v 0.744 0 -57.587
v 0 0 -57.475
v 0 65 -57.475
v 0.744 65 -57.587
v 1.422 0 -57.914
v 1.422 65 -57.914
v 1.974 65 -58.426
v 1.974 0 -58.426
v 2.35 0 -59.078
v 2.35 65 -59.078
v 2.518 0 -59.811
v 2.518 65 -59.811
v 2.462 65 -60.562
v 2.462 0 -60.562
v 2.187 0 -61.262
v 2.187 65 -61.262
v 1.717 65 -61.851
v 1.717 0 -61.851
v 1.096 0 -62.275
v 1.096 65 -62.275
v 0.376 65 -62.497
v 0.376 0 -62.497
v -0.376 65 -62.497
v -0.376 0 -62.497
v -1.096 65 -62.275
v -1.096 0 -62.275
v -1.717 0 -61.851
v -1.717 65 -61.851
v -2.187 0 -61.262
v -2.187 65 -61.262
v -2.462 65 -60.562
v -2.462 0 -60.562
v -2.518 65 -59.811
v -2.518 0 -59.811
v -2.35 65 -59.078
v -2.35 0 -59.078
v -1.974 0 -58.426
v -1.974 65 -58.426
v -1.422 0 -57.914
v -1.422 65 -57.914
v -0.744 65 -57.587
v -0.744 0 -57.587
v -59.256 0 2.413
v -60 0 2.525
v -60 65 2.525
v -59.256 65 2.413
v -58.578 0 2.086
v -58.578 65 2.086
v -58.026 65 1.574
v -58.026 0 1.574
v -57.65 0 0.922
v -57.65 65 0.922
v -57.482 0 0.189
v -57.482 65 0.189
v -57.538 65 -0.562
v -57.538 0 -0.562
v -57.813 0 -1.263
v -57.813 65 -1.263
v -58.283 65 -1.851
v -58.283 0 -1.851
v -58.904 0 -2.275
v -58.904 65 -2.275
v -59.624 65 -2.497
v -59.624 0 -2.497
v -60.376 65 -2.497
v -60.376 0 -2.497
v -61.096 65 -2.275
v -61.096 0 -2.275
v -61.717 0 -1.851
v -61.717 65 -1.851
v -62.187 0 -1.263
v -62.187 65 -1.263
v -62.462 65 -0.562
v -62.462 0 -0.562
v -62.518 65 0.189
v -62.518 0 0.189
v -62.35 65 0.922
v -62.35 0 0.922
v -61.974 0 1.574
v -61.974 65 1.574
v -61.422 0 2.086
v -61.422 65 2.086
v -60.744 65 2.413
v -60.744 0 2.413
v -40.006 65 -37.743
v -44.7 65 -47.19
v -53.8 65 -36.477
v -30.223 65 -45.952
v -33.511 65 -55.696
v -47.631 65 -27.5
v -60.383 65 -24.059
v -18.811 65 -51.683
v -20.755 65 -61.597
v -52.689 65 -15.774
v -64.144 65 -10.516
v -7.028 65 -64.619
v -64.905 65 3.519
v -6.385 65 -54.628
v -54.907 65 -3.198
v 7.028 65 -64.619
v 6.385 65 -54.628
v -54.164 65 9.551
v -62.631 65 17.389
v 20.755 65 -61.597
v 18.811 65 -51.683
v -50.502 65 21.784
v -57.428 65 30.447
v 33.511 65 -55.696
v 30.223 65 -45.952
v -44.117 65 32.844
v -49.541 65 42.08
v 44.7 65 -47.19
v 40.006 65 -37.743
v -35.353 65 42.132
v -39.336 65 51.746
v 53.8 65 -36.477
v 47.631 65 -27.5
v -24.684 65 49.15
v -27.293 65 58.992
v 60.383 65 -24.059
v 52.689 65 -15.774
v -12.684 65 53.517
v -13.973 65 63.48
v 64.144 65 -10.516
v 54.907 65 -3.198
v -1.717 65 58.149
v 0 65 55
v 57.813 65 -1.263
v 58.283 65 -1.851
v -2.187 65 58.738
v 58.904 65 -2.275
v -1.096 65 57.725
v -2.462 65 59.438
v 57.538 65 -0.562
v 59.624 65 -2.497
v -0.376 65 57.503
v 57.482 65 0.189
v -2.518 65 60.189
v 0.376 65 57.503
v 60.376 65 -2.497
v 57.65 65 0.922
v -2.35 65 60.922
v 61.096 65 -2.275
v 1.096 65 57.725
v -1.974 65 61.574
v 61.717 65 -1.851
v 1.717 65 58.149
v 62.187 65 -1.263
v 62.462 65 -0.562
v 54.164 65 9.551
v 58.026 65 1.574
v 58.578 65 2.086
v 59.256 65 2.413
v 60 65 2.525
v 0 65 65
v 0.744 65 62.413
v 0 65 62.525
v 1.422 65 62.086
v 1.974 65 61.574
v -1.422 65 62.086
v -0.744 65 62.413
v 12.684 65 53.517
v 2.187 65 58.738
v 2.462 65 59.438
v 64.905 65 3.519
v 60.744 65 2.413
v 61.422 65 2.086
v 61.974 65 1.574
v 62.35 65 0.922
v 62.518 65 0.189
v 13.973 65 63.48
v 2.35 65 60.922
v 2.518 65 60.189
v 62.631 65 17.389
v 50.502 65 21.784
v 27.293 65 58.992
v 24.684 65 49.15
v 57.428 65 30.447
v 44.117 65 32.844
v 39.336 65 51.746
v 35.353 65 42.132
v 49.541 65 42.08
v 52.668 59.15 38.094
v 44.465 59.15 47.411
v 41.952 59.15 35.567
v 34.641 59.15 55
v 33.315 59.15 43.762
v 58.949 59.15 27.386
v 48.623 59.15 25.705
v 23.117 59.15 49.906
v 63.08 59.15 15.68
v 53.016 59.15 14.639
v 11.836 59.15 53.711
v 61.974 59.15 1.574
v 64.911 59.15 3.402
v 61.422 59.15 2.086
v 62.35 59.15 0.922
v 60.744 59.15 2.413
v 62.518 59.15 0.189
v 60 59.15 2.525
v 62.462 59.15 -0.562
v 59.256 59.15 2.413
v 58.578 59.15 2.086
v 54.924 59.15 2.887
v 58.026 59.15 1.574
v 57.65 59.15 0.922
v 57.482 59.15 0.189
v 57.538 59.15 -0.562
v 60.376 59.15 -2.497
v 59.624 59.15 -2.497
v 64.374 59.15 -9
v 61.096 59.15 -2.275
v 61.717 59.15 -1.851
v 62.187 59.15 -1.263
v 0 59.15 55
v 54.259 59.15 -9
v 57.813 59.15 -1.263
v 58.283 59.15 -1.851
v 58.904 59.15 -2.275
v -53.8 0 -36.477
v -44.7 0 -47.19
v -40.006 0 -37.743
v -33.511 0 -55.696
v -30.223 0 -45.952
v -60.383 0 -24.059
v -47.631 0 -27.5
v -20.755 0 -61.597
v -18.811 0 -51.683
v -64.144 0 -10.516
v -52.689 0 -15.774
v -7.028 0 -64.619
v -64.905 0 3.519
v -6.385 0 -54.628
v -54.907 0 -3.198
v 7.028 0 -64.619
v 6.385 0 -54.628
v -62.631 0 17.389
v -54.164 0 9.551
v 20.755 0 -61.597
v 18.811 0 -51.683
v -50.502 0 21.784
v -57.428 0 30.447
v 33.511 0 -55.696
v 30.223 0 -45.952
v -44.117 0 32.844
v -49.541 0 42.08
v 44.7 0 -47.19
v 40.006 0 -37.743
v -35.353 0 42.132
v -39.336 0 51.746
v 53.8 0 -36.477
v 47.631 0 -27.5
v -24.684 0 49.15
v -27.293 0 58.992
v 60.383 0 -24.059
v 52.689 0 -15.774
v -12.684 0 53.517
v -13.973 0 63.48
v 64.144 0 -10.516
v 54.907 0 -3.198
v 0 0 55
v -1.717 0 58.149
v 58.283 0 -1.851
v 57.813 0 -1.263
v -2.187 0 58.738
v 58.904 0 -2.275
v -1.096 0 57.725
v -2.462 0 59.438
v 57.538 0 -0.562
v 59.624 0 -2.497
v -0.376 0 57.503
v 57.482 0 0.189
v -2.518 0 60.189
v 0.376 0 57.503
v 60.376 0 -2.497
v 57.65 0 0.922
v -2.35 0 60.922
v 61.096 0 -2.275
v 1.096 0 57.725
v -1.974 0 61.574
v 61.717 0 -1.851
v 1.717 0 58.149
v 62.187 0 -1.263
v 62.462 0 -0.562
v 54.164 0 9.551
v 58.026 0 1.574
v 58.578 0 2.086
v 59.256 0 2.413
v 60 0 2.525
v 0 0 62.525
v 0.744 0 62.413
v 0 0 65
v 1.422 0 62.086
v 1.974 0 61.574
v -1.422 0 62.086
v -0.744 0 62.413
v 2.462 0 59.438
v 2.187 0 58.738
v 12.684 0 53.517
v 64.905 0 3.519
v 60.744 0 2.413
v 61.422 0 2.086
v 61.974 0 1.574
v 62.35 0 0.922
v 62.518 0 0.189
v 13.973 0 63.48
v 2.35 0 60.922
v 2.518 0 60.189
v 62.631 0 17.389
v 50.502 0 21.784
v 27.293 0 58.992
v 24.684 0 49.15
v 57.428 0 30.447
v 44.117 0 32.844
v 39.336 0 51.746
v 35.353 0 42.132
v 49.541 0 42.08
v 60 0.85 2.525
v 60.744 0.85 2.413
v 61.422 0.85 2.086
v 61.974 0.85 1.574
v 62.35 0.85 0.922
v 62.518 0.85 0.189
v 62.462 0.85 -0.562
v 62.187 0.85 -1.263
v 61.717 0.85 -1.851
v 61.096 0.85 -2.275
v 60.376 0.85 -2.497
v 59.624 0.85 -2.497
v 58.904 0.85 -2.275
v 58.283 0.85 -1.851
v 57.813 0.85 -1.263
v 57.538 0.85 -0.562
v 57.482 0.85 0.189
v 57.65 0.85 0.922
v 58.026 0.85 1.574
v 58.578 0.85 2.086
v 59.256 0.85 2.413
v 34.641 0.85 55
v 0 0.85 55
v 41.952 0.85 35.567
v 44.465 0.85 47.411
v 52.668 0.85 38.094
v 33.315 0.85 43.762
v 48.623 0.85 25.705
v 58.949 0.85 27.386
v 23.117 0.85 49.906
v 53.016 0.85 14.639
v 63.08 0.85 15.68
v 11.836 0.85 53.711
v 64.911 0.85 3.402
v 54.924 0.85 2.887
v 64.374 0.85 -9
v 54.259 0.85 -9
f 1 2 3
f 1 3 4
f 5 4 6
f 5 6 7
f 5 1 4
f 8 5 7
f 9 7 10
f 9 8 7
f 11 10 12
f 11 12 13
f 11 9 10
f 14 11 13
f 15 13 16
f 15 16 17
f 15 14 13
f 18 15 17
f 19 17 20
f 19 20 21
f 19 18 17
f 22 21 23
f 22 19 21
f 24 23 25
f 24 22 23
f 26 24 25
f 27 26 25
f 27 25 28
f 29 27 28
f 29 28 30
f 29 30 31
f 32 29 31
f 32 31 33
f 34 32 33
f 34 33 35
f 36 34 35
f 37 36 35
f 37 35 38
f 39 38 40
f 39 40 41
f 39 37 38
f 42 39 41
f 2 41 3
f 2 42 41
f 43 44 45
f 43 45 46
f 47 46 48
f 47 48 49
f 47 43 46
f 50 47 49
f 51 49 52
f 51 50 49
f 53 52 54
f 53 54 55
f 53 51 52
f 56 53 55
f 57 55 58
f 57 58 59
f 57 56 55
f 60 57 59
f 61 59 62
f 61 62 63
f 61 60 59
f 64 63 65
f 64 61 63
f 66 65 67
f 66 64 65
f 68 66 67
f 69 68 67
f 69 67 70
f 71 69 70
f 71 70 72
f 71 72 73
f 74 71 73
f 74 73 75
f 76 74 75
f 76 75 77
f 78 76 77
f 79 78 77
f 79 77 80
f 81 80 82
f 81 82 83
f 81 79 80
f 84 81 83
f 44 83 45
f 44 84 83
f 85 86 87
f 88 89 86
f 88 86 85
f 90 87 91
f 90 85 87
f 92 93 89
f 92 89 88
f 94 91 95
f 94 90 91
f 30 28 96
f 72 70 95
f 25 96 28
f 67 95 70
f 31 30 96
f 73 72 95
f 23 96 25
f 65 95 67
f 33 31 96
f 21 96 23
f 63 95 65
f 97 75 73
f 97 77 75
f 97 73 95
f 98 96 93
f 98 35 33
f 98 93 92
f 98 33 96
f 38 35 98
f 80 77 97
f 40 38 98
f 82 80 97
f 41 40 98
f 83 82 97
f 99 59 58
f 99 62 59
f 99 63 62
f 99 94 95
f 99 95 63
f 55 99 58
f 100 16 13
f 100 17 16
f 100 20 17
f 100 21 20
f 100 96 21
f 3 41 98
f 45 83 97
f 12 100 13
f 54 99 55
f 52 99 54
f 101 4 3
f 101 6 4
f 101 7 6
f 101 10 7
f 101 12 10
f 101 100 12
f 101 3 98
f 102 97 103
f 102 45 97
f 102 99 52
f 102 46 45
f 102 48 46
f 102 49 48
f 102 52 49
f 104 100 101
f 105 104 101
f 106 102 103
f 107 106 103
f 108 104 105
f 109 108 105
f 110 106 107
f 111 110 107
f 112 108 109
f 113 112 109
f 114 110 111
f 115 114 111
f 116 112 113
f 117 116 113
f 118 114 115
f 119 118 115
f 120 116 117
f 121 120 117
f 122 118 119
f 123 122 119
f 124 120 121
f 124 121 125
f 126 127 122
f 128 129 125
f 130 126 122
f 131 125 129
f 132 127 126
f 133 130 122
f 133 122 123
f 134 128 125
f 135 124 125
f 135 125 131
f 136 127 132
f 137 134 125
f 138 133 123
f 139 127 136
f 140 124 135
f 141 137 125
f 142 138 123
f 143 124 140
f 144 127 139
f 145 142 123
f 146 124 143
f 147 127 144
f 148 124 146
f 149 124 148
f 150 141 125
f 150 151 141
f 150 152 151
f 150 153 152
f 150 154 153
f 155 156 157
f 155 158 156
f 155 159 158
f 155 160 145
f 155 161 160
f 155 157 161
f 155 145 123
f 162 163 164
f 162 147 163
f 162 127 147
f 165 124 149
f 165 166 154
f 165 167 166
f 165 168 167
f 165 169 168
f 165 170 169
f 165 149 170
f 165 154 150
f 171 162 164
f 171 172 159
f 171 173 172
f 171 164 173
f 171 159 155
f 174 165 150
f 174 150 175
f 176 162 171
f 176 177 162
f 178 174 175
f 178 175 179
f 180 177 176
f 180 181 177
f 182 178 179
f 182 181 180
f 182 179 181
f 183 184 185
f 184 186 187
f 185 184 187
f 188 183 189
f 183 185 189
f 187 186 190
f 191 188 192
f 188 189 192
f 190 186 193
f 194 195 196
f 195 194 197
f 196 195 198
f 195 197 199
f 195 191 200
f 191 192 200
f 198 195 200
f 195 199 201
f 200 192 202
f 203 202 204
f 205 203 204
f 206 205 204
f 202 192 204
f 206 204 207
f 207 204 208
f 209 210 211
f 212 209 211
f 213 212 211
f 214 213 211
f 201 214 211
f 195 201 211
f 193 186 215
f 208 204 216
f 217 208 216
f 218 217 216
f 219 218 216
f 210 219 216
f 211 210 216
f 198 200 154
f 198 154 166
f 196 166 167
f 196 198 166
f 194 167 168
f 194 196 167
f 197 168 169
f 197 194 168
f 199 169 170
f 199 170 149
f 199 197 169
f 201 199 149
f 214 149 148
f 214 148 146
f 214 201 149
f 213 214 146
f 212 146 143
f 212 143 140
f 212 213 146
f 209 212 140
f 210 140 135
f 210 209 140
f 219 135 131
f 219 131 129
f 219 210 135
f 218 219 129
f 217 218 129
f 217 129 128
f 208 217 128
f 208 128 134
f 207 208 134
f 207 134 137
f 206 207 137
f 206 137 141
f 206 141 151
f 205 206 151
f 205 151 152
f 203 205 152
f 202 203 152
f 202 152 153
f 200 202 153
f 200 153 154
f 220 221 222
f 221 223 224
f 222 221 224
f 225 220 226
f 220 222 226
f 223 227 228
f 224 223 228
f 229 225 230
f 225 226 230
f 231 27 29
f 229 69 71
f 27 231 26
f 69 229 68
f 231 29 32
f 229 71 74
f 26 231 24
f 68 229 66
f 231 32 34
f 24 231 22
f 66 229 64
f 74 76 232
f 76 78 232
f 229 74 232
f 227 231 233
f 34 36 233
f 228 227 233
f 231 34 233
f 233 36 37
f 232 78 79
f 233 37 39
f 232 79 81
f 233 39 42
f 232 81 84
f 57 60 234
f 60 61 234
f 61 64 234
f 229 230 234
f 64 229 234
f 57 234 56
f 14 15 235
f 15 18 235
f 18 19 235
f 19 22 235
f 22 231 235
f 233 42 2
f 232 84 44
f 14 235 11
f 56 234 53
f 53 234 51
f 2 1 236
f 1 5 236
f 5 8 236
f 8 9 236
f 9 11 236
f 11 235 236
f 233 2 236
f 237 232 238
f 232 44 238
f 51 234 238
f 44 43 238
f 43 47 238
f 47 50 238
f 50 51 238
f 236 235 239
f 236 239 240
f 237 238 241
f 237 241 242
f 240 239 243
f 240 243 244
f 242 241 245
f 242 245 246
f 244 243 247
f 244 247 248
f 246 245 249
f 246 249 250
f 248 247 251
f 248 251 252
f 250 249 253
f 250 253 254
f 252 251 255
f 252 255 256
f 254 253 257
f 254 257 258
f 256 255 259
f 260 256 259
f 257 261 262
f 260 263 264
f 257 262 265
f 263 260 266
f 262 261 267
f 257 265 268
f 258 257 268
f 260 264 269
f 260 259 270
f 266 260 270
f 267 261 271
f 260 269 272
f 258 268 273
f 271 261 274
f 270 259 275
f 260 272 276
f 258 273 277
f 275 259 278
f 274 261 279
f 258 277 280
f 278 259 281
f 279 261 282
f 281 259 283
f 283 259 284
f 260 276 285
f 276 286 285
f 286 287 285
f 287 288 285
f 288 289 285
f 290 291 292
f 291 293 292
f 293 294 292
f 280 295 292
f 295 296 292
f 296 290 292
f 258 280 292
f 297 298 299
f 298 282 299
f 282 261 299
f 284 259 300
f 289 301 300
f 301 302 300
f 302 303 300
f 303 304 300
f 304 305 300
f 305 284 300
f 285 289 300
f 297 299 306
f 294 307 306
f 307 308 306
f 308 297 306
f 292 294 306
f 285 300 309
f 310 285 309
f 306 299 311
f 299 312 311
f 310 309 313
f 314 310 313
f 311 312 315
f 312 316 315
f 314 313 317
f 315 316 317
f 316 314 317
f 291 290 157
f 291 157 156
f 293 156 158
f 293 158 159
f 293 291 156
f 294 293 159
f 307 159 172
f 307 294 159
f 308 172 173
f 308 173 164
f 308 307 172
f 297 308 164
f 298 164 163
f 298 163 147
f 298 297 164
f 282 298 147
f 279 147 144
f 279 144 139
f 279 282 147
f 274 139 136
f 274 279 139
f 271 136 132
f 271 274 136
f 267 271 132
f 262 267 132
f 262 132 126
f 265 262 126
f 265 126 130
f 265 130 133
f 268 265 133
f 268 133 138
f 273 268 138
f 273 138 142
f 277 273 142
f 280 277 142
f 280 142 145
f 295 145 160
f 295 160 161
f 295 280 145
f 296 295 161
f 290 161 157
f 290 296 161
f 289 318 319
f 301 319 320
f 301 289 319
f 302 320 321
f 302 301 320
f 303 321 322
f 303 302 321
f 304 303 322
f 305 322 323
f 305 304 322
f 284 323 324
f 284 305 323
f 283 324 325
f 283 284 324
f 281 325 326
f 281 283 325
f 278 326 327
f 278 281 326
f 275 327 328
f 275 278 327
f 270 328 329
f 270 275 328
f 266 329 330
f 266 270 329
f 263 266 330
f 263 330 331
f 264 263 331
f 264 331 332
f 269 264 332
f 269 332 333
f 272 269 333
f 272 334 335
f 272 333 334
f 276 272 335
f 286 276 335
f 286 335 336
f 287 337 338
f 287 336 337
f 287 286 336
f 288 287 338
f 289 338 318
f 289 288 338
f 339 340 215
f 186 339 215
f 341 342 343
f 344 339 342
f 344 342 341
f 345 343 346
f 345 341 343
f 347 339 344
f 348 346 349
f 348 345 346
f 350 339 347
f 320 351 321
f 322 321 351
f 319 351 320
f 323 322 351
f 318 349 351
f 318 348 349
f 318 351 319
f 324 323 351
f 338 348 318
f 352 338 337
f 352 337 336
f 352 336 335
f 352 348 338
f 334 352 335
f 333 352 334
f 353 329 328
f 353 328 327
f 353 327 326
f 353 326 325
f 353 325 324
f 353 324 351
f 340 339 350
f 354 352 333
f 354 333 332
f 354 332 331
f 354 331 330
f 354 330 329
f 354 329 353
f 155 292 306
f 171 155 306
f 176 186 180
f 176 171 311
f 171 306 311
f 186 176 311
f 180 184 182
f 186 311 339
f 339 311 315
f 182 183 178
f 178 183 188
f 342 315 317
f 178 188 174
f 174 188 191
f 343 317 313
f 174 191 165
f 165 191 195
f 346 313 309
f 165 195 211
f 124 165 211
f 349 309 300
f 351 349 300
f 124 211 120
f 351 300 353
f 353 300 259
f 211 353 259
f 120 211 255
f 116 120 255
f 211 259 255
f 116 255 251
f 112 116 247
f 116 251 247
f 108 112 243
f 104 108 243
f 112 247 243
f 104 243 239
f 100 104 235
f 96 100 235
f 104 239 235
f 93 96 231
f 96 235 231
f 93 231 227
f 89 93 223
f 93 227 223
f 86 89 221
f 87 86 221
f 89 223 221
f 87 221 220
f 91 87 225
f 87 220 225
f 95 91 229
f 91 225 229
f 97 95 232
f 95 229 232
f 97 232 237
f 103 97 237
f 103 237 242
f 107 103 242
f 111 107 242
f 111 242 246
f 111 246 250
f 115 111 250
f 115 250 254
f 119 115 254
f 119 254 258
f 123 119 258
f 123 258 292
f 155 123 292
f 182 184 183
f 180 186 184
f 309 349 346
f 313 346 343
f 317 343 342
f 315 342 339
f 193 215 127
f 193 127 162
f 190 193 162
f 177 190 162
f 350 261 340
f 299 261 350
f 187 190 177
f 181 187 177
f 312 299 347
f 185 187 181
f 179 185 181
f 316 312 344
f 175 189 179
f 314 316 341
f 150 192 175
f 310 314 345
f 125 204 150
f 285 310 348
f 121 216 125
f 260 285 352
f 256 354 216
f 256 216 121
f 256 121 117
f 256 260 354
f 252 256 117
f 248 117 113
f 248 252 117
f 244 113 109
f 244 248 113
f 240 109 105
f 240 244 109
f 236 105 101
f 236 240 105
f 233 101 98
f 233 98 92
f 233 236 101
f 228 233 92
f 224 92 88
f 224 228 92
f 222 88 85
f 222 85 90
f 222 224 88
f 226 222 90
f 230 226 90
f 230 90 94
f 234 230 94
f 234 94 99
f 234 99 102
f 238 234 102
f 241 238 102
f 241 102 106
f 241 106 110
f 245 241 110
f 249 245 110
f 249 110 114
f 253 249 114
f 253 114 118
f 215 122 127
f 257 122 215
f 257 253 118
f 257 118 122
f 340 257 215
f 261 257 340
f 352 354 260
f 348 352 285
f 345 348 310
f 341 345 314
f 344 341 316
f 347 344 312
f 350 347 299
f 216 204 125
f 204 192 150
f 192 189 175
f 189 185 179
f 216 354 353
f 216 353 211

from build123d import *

# Parameters (mm, degrees)
SKETCH1_R           = 65
SKETCH1_R_2         = 2.525
SKETCH1_R_3         = 55
BOSS_EXTRUDE1_DEPTH = 65
SKETCH2_R           = 9.525
CUT_EXTRUDE1_DEPTH  = 113.583302492
SKETCH3_W           = 64
SKETCH3_H           = 58.3
CUT_EXTRUDE2_DEPTH  = 113.583302665


with BuildPart() as part:
    # Sketch1 → Boss-Extrude1 (new body)
    with BuildSketch(Plane(origin=(0, 0, 0), x_dir=(1, 0, 0), z_dir=(0, 1, 0))):
        with Locations(Location((0, 0, 0), (0, 0, 270))):
            Circle(SKETCH1_R)
        with Locations(Location((0, 60, 0), (0, 0, 270))):
            Circle(SKETCH1_R_2, mode=Mode.SUBTRACT)
        with Locations(Location((60, 0, 0), (0, 0, 270))):
            Circle(SKETCH1_R_2, mode=Mode.SUBTRACT)
        with Locations(Location((0, -60, 0), (0, 0, 270))):
            Circle(SKETCH1_R_2, mode=Mode.SUBTRACT)
        with Locations(Location((-60, 0, 0), (0, 0, 270))):
            Circle(SKETCH1_R_2, mode=Mode.SUBTRACT)
        with Locations(Location((0, 0, 0), (0, 0, 270))):
            Circle(SKETCH1_R_3, mode=Mode.SUBTRACT)
    extrude(amount=BOSS_EXTRUDE1_DEPTH)

    # Sketch2 → Cut-Extrude1 (cut, through all)
    with BuildSketch(Plane(origin=(0, 0, 0), x_dir=(0, 0, -1), z_dir=(1, 0, 0))):
        with Locations(Location((-24.25, 30, 0), (0, 0, 180))):
            Circle(SKETCH2_R)
    extrude(amount=CUT_EXTRUDE1_DEPTH, mode=Mode.SUBTRACT)

    # Sketch3 → Cut-Extrude2 (cut, through all)
    with BuildSketch(Plane(origin=(0, 0, 0), x_dir=(0, 0, -1), z_dir=(1, 0, 0))):
        with Locations((-23, 30)):
            Rectangle(SKETCH3_W, SKETCH3_H)
        with BuildLine():
            Line((-41.625, 43.85), (-41.625, 53.85))
            ThreePointArc((-41.625, 53.85), (-44.875, 57.1), (-48.125, 53.85))
            Line((-48.125, 53.85), (-48.125, 43.85))
            ThreePointArc((-48.125, 43.85), (-44.875, 40.6), (-41.625, 43.85))
        make_face(mode=Mode.SUBTRACT)
        with BuildLine():
            Line((2.125, 43.85), (2.125, 53.85))
            ThreePointArc((2.125, 53.85), (-1.125, 57.1), (-4.375, 53.85))
            Line((-4.375, 53.85), (-4.375, 43.85))
            ThreePointArc((-4.375, 43.85), (-1.125, 40.6), (2.125, 43.85))
        make_face(mode=Mode.SUBTRACT)
    extrude(amount=CUT_EXTRUDE2_DEPTH, mode=Mode.SUBTRACT)


with BuildPart() as cut_extrude2_kept_piece:
    # of the separate pieces the step leaves, the one the design keeps (cut_extrude2_pieces_kept)
    add(part.part.solids().sort_by_distance((0, 0, 65))[0])


solid = cut_extrude2_kept_piece.part
